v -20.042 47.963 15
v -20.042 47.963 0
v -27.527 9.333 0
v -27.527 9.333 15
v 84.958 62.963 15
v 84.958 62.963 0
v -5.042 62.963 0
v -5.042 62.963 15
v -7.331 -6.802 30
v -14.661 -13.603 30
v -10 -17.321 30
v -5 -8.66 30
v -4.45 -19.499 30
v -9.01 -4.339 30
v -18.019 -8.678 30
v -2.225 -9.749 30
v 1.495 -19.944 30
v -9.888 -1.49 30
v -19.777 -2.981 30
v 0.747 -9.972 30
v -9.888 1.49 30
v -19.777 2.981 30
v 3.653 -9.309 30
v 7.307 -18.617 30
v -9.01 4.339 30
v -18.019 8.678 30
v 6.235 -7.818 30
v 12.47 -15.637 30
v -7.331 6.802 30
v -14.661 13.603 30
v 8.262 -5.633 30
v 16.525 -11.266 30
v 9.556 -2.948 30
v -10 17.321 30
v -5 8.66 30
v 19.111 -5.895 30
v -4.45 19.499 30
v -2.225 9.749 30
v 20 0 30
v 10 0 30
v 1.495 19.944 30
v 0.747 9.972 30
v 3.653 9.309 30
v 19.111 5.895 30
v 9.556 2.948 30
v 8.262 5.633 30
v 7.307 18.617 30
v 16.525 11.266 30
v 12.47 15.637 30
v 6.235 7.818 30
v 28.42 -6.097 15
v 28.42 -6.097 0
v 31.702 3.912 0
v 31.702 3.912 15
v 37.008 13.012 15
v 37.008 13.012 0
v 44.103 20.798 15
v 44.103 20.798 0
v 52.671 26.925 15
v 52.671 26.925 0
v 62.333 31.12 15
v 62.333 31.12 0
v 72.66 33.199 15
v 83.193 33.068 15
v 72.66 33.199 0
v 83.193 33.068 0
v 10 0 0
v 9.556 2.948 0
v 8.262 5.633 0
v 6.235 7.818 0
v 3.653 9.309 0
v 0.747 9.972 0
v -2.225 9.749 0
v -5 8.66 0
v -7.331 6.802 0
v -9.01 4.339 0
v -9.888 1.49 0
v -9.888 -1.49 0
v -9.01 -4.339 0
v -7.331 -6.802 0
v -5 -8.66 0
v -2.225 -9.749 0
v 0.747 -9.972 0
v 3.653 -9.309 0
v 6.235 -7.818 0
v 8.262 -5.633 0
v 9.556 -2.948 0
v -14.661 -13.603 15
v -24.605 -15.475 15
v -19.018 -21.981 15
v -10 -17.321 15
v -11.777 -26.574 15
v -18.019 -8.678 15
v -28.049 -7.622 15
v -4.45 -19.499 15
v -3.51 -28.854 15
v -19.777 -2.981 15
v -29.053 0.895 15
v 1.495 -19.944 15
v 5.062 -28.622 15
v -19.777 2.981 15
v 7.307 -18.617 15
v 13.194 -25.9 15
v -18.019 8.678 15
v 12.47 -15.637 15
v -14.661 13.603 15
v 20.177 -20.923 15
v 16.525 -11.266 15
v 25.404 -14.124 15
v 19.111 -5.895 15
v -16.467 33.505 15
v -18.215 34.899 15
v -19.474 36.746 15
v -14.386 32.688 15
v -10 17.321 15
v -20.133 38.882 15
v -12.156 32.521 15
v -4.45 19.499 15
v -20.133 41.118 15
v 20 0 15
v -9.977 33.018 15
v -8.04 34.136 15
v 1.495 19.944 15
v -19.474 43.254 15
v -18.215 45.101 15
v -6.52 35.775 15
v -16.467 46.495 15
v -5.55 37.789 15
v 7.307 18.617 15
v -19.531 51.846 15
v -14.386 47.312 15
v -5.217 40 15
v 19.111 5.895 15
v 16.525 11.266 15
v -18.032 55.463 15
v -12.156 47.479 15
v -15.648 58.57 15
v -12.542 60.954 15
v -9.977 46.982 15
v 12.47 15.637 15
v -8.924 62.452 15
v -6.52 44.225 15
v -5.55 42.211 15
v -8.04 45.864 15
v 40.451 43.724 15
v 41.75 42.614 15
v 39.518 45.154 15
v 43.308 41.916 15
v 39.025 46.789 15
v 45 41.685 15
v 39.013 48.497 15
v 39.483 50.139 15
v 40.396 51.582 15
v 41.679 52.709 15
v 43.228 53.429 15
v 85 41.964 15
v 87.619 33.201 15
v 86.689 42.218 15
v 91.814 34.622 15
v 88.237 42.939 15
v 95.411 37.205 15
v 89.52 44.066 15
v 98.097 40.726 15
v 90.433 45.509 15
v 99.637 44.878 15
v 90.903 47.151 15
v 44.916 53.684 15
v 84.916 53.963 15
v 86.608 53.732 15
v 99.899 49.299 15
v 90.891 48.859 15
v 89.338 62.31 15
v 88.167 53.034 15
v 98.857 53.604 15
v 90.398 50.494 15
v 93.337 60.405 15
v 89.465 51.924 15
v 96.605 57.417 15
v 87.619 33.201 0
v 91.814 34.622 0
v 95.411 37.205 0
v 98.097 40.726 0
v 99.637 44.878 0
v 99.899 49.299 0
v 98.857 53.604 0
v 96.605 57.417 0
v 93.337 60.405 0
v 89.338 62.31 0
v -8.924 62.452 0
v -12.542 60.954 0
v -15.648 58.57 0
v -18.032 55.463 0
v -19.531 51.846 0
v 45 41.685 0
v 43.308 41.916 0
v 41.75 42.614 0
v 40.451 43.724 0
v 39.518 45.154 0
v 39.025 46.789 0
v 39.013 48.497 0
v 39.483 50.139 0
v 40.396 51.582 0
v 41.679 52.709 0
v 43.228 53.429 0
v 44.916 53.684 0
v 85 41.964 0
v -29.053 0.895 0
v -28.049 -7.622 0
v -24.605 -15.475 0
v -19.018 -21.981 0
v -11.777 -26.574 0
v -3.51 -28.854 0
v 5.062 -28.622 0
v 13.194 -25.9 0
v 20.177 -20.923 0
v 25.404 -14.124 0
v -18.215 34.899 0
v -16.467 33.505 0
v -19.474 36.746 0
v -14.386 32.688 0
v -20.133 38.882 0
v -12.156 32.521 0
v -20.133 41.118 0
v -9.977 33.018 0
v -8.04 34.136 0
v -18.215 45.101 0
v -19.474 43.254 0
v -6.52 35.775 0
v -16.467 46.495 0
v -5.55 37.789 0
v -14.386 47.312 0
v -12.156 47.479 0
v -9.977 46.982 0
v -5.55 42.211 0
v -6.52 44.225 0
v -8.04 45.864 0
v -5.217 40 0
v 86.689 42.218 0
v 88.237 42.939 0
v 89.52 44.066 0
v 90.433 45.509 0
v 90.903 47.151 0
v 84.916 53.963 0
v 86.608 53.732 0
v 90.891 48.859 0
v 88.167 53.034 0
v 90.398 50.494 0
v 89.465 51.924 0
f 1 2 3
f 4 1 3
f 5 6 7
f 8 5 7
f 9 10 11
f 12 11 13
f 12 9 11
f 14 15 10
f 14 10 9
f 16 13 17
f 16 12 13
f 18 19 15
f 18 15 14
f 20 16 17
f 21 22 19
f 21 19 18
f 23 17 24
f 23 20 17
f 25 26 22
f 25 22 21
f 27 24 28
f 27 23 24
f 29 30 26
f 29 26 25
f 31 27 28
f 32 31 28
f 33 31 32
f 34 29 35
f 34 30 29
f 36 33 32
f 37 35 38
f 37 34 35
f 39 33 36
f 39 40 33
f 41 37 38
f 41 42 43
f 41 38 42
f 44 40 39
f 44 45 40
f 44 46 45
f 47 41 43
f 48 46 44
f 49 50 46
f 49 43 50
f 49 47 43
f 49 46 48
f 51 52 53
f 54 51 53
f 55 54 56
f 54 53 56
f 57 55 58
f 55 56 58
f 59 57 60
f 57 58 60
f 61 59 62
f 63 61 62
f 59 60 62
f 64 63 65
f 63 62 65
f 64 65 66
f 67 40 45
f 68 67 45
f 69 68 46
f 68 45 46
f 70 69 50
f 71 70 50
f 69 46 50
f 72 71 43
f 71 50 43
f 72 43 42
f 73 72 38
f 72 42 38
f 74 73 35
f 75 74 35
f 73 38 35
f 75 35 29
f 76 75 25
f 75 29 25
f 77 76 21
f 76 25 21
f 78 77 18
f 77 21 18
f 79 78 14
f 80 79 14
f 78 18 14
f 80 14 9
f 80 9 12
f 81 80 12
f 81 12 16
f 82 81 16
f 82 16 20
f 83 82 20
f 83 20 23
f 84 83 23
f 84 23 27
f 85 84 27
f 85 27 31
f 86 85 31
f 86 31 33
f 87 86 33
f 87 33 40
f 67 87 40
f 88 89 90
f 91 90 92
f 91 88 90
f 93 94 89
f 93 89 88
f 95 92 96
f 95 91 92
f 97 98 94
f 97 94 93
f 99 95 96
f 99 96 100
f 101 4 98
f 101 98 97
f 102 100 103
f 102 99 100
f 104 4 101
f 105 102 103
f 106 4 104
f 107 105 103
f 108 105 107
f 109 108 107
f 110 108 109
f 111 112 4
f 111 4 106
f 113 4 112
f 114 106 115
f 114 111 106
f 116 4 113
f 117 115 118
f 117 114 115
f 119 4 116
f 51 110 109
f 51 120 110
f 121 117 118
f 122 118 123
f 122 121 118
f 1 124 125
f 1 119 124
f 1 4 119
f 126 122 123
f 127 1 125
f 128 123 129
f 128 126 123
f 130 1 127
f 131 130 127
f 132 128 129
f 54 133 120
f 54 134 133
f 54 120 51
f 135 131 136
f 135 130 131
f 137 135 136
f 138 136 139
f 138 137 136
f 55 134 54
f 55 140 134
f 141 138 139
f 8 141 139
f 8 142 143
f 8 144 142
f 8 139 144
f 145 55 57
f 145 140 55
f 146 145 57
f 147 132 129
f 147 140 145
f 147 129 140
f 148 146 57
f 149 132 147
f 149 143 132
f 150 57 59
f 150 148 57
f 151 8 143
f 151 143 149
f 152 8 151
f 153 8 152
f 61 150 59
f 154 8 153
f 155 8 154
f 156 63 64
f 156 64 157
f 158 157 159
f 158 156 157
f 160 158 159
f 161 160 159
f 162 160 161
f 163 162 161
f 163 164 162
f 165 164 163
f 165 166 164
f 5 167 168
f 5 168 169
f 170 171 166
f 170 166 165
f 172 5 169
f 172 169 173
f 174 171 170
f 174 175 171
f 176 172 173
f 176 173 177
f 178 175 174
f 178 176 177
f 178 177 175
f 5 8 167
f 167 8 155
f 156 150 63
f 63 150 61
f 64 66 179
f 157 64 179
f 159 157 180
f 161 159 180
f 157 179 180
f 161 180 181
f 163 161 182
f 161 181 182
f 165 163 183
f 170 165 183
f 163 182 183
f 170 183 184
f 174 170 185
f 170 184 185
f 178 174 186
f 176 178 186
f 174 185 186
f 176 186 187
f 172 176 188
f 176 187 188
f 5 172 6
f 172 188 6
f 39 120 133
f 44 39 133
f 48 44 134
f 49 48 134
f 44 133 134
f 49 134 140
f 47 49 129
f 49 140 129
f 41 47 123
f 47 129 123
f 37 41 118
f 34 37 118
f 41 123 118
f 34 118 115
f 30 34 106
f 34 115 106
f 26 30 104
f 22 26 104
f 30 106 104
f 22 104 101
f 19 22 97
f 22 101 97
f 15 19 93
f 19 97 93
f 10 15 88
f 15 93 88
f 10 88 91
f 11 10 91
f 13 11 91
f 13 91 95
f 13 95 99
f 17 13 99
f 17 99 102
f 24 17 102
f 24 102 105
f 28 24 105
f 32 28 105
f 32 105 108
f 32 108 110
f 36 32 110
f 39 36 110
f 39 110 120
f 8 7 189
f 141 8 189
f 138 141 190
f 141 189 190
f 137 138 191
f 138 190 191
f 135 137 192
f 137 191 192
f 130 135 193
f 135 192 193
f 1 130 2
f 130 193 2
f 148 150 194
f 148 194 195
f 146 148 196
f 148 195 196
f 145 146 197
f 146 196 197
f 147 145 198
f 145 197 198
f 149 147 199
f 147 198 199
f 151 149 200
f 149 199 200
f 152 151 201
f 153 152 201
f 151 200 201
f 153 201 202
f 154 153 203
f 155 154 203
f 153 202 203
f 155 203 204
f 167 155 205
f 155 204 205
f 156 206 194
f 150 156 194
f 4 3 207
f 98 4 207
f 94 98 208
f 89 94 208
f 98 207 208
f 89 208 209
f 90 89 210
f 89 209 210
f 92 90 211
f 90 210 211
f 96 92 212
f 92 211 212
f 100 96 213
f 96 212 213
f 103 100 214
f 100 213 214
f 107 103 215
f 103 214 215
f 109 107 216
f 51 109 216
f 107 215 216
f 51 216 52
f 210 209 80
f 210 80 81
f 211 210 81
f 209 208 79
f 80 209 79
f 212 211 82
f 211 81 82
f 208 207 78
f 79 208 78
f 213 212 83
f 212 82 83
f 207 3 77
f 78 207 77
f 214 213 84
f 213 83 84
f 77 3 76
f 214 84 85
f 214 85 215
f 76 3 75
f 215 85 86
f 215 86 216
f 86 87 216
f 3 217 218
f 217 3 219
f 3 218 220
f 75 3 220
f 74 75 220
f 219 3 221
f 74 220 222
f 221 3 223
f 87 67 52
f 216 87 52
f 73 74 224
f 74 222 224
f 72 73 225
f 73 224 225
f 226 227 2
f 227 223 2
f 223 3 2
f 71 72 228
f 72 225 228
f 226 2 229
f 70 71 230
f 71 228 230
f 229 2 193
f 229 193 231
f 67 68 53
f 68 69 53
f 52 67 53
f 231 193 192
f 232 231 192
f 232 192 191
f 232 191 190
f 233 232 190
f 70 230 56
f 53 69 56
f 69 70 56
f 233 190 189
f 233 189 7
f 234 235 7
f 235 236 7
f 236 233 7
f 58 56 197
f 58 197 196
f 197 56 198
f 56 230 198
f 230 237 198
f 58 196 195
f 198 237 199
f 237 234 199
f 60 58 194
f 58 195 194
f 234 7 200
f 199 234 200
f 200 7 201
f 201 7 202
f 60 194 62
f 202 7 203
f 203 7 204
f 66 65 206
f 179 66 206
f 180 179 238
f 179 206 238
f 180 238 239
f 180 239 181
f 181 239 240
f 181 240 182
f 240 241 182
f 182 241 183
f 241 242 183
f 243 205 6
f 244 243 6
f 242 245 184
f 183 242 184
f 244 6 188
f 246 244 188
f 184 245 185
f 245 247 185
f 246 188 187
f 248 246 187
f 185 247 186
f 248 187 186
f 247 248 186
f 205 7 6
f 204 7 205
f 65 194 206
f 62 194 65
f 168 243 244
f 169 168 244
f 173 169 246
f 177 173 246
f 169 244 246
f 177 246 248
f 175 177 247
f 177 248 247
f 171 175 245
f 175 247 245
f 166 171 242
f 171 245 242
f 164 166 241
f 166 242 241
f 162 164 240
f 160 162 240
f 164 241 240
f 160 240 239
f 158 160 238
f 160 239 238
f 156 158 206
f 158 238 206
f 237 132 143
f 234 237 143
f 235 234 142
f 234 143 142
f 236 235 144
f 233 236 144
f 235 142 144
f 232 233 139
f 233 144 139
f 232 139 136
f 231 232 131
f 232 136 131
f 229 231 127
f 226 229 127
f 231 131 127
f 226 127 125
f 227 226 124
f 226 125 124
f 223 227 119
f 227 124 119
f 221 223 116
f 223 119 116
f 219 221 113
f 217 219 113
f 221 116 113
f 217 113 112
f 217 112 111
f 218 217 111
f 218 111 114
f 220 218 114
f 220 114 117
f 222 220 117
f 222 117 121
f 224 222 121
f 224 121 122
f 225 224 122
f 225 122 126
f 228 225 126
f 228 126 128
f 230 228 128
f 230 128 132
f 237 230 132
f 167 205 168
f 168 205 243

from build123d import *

# Parameters (mm, degrees)
BOSS_EXTRUDE2_DEPTH = 15
SKETCH2_R           = 20
BOSS_EXTRUDE3_DEPTH = 35
SKETCH3_R           = 10
CUT_EXTRUDE2_DEPTH  = 51
SKETCH6_R           = 20
CUT_EXTRUDE3_DEPTH  = 20
SKETCH7_R           = 7.5
CUT_EXTRUDE4_DEPTH  = 31


with BuildPart() as part:
    # Sketch1 → Boss-Extrude2 (new body)
    with BuildSketch(Plane.XY):
        with BuildLine():
            Line((84.958136085, 62.963493234), (-5.041863915, 62.963493234))
            ThreePointArc((-5.041863915, 62.963493234), (-15.648465633, 58.570094952), (-20.041863915, 47.963493234))
            Line((-20.041863915, 47.963493234), (-27.527219981, 9.333410593))
            ThreePointArc((-27.527219981, 9.333410593), (-7.728043394, -28.020309393), (28.419860478, -6.096878185))
            ThreePointArc((28.419860478, -6.096878185), (48.225361717, 24.087490733), (83.192615122, 33.067757746))
            ThreePointArc((83.192615122, 33.067757746), (99.932047269, 47.079194733), (84.958136085, 62.963493234))
        make_face()
        with BuildLine():
            ThreePointArc((45, 41.684539724), (38.958282136, 47.642529759), (44.91627217, 53.684247623))
            Line((44.91627217, 53.684247623), (84.91627217, 53.963347184))
            ThreePointArc((84.91627217, 53.963347184), (90.957990034, 48.005357149), (85, 41.963639285))
            Line((85, 41.963639285), (45, 41.684539724))
        make_face(mode=Mode.SUBTRACT)
    extrude(amount=BOSS_EXTRUDE2_DEPTH)

    # Sketch2 → Boss-Extrude3 (add)
    with BuildSketch(Plane.XY.offset(15)):
        Circle(SKETCH2_R)
    extrude(amount=BOSS_EXTRUDE3_DEPTH)

    # Sketch3 → Cut-Extrude2 (cut, through all)
    with BuildSketch(Plane.XY.offset(50)):
        Circle(SKETCH3_R)
    extrude(amount=-CUT_EXTRUDE2_DEPTH, mode=Mode.SUBTRACT)

    # Sketch6 → Cut-Extrude3 (cut)
    with BuildSketch(Plane.XY.offset(50)):
        Circle(SKETCH6_R)
    extrude(amount=-CUT_EXTRUDE3_DEPTH, mode=Mode.SUBTRACT)

    # Sketch7 → Cut-Extrude4 (cut, through all)
    with BuildSketch(Plane.XY.offset(30)):
        with Locations((-12.716641072, 40)):
            Circle(SKETCH7_R)
    extrude(amount=-CUT_EXTRUDE4_DEPTH, mode=Mode.SUBTRACT)


solid = part.part
